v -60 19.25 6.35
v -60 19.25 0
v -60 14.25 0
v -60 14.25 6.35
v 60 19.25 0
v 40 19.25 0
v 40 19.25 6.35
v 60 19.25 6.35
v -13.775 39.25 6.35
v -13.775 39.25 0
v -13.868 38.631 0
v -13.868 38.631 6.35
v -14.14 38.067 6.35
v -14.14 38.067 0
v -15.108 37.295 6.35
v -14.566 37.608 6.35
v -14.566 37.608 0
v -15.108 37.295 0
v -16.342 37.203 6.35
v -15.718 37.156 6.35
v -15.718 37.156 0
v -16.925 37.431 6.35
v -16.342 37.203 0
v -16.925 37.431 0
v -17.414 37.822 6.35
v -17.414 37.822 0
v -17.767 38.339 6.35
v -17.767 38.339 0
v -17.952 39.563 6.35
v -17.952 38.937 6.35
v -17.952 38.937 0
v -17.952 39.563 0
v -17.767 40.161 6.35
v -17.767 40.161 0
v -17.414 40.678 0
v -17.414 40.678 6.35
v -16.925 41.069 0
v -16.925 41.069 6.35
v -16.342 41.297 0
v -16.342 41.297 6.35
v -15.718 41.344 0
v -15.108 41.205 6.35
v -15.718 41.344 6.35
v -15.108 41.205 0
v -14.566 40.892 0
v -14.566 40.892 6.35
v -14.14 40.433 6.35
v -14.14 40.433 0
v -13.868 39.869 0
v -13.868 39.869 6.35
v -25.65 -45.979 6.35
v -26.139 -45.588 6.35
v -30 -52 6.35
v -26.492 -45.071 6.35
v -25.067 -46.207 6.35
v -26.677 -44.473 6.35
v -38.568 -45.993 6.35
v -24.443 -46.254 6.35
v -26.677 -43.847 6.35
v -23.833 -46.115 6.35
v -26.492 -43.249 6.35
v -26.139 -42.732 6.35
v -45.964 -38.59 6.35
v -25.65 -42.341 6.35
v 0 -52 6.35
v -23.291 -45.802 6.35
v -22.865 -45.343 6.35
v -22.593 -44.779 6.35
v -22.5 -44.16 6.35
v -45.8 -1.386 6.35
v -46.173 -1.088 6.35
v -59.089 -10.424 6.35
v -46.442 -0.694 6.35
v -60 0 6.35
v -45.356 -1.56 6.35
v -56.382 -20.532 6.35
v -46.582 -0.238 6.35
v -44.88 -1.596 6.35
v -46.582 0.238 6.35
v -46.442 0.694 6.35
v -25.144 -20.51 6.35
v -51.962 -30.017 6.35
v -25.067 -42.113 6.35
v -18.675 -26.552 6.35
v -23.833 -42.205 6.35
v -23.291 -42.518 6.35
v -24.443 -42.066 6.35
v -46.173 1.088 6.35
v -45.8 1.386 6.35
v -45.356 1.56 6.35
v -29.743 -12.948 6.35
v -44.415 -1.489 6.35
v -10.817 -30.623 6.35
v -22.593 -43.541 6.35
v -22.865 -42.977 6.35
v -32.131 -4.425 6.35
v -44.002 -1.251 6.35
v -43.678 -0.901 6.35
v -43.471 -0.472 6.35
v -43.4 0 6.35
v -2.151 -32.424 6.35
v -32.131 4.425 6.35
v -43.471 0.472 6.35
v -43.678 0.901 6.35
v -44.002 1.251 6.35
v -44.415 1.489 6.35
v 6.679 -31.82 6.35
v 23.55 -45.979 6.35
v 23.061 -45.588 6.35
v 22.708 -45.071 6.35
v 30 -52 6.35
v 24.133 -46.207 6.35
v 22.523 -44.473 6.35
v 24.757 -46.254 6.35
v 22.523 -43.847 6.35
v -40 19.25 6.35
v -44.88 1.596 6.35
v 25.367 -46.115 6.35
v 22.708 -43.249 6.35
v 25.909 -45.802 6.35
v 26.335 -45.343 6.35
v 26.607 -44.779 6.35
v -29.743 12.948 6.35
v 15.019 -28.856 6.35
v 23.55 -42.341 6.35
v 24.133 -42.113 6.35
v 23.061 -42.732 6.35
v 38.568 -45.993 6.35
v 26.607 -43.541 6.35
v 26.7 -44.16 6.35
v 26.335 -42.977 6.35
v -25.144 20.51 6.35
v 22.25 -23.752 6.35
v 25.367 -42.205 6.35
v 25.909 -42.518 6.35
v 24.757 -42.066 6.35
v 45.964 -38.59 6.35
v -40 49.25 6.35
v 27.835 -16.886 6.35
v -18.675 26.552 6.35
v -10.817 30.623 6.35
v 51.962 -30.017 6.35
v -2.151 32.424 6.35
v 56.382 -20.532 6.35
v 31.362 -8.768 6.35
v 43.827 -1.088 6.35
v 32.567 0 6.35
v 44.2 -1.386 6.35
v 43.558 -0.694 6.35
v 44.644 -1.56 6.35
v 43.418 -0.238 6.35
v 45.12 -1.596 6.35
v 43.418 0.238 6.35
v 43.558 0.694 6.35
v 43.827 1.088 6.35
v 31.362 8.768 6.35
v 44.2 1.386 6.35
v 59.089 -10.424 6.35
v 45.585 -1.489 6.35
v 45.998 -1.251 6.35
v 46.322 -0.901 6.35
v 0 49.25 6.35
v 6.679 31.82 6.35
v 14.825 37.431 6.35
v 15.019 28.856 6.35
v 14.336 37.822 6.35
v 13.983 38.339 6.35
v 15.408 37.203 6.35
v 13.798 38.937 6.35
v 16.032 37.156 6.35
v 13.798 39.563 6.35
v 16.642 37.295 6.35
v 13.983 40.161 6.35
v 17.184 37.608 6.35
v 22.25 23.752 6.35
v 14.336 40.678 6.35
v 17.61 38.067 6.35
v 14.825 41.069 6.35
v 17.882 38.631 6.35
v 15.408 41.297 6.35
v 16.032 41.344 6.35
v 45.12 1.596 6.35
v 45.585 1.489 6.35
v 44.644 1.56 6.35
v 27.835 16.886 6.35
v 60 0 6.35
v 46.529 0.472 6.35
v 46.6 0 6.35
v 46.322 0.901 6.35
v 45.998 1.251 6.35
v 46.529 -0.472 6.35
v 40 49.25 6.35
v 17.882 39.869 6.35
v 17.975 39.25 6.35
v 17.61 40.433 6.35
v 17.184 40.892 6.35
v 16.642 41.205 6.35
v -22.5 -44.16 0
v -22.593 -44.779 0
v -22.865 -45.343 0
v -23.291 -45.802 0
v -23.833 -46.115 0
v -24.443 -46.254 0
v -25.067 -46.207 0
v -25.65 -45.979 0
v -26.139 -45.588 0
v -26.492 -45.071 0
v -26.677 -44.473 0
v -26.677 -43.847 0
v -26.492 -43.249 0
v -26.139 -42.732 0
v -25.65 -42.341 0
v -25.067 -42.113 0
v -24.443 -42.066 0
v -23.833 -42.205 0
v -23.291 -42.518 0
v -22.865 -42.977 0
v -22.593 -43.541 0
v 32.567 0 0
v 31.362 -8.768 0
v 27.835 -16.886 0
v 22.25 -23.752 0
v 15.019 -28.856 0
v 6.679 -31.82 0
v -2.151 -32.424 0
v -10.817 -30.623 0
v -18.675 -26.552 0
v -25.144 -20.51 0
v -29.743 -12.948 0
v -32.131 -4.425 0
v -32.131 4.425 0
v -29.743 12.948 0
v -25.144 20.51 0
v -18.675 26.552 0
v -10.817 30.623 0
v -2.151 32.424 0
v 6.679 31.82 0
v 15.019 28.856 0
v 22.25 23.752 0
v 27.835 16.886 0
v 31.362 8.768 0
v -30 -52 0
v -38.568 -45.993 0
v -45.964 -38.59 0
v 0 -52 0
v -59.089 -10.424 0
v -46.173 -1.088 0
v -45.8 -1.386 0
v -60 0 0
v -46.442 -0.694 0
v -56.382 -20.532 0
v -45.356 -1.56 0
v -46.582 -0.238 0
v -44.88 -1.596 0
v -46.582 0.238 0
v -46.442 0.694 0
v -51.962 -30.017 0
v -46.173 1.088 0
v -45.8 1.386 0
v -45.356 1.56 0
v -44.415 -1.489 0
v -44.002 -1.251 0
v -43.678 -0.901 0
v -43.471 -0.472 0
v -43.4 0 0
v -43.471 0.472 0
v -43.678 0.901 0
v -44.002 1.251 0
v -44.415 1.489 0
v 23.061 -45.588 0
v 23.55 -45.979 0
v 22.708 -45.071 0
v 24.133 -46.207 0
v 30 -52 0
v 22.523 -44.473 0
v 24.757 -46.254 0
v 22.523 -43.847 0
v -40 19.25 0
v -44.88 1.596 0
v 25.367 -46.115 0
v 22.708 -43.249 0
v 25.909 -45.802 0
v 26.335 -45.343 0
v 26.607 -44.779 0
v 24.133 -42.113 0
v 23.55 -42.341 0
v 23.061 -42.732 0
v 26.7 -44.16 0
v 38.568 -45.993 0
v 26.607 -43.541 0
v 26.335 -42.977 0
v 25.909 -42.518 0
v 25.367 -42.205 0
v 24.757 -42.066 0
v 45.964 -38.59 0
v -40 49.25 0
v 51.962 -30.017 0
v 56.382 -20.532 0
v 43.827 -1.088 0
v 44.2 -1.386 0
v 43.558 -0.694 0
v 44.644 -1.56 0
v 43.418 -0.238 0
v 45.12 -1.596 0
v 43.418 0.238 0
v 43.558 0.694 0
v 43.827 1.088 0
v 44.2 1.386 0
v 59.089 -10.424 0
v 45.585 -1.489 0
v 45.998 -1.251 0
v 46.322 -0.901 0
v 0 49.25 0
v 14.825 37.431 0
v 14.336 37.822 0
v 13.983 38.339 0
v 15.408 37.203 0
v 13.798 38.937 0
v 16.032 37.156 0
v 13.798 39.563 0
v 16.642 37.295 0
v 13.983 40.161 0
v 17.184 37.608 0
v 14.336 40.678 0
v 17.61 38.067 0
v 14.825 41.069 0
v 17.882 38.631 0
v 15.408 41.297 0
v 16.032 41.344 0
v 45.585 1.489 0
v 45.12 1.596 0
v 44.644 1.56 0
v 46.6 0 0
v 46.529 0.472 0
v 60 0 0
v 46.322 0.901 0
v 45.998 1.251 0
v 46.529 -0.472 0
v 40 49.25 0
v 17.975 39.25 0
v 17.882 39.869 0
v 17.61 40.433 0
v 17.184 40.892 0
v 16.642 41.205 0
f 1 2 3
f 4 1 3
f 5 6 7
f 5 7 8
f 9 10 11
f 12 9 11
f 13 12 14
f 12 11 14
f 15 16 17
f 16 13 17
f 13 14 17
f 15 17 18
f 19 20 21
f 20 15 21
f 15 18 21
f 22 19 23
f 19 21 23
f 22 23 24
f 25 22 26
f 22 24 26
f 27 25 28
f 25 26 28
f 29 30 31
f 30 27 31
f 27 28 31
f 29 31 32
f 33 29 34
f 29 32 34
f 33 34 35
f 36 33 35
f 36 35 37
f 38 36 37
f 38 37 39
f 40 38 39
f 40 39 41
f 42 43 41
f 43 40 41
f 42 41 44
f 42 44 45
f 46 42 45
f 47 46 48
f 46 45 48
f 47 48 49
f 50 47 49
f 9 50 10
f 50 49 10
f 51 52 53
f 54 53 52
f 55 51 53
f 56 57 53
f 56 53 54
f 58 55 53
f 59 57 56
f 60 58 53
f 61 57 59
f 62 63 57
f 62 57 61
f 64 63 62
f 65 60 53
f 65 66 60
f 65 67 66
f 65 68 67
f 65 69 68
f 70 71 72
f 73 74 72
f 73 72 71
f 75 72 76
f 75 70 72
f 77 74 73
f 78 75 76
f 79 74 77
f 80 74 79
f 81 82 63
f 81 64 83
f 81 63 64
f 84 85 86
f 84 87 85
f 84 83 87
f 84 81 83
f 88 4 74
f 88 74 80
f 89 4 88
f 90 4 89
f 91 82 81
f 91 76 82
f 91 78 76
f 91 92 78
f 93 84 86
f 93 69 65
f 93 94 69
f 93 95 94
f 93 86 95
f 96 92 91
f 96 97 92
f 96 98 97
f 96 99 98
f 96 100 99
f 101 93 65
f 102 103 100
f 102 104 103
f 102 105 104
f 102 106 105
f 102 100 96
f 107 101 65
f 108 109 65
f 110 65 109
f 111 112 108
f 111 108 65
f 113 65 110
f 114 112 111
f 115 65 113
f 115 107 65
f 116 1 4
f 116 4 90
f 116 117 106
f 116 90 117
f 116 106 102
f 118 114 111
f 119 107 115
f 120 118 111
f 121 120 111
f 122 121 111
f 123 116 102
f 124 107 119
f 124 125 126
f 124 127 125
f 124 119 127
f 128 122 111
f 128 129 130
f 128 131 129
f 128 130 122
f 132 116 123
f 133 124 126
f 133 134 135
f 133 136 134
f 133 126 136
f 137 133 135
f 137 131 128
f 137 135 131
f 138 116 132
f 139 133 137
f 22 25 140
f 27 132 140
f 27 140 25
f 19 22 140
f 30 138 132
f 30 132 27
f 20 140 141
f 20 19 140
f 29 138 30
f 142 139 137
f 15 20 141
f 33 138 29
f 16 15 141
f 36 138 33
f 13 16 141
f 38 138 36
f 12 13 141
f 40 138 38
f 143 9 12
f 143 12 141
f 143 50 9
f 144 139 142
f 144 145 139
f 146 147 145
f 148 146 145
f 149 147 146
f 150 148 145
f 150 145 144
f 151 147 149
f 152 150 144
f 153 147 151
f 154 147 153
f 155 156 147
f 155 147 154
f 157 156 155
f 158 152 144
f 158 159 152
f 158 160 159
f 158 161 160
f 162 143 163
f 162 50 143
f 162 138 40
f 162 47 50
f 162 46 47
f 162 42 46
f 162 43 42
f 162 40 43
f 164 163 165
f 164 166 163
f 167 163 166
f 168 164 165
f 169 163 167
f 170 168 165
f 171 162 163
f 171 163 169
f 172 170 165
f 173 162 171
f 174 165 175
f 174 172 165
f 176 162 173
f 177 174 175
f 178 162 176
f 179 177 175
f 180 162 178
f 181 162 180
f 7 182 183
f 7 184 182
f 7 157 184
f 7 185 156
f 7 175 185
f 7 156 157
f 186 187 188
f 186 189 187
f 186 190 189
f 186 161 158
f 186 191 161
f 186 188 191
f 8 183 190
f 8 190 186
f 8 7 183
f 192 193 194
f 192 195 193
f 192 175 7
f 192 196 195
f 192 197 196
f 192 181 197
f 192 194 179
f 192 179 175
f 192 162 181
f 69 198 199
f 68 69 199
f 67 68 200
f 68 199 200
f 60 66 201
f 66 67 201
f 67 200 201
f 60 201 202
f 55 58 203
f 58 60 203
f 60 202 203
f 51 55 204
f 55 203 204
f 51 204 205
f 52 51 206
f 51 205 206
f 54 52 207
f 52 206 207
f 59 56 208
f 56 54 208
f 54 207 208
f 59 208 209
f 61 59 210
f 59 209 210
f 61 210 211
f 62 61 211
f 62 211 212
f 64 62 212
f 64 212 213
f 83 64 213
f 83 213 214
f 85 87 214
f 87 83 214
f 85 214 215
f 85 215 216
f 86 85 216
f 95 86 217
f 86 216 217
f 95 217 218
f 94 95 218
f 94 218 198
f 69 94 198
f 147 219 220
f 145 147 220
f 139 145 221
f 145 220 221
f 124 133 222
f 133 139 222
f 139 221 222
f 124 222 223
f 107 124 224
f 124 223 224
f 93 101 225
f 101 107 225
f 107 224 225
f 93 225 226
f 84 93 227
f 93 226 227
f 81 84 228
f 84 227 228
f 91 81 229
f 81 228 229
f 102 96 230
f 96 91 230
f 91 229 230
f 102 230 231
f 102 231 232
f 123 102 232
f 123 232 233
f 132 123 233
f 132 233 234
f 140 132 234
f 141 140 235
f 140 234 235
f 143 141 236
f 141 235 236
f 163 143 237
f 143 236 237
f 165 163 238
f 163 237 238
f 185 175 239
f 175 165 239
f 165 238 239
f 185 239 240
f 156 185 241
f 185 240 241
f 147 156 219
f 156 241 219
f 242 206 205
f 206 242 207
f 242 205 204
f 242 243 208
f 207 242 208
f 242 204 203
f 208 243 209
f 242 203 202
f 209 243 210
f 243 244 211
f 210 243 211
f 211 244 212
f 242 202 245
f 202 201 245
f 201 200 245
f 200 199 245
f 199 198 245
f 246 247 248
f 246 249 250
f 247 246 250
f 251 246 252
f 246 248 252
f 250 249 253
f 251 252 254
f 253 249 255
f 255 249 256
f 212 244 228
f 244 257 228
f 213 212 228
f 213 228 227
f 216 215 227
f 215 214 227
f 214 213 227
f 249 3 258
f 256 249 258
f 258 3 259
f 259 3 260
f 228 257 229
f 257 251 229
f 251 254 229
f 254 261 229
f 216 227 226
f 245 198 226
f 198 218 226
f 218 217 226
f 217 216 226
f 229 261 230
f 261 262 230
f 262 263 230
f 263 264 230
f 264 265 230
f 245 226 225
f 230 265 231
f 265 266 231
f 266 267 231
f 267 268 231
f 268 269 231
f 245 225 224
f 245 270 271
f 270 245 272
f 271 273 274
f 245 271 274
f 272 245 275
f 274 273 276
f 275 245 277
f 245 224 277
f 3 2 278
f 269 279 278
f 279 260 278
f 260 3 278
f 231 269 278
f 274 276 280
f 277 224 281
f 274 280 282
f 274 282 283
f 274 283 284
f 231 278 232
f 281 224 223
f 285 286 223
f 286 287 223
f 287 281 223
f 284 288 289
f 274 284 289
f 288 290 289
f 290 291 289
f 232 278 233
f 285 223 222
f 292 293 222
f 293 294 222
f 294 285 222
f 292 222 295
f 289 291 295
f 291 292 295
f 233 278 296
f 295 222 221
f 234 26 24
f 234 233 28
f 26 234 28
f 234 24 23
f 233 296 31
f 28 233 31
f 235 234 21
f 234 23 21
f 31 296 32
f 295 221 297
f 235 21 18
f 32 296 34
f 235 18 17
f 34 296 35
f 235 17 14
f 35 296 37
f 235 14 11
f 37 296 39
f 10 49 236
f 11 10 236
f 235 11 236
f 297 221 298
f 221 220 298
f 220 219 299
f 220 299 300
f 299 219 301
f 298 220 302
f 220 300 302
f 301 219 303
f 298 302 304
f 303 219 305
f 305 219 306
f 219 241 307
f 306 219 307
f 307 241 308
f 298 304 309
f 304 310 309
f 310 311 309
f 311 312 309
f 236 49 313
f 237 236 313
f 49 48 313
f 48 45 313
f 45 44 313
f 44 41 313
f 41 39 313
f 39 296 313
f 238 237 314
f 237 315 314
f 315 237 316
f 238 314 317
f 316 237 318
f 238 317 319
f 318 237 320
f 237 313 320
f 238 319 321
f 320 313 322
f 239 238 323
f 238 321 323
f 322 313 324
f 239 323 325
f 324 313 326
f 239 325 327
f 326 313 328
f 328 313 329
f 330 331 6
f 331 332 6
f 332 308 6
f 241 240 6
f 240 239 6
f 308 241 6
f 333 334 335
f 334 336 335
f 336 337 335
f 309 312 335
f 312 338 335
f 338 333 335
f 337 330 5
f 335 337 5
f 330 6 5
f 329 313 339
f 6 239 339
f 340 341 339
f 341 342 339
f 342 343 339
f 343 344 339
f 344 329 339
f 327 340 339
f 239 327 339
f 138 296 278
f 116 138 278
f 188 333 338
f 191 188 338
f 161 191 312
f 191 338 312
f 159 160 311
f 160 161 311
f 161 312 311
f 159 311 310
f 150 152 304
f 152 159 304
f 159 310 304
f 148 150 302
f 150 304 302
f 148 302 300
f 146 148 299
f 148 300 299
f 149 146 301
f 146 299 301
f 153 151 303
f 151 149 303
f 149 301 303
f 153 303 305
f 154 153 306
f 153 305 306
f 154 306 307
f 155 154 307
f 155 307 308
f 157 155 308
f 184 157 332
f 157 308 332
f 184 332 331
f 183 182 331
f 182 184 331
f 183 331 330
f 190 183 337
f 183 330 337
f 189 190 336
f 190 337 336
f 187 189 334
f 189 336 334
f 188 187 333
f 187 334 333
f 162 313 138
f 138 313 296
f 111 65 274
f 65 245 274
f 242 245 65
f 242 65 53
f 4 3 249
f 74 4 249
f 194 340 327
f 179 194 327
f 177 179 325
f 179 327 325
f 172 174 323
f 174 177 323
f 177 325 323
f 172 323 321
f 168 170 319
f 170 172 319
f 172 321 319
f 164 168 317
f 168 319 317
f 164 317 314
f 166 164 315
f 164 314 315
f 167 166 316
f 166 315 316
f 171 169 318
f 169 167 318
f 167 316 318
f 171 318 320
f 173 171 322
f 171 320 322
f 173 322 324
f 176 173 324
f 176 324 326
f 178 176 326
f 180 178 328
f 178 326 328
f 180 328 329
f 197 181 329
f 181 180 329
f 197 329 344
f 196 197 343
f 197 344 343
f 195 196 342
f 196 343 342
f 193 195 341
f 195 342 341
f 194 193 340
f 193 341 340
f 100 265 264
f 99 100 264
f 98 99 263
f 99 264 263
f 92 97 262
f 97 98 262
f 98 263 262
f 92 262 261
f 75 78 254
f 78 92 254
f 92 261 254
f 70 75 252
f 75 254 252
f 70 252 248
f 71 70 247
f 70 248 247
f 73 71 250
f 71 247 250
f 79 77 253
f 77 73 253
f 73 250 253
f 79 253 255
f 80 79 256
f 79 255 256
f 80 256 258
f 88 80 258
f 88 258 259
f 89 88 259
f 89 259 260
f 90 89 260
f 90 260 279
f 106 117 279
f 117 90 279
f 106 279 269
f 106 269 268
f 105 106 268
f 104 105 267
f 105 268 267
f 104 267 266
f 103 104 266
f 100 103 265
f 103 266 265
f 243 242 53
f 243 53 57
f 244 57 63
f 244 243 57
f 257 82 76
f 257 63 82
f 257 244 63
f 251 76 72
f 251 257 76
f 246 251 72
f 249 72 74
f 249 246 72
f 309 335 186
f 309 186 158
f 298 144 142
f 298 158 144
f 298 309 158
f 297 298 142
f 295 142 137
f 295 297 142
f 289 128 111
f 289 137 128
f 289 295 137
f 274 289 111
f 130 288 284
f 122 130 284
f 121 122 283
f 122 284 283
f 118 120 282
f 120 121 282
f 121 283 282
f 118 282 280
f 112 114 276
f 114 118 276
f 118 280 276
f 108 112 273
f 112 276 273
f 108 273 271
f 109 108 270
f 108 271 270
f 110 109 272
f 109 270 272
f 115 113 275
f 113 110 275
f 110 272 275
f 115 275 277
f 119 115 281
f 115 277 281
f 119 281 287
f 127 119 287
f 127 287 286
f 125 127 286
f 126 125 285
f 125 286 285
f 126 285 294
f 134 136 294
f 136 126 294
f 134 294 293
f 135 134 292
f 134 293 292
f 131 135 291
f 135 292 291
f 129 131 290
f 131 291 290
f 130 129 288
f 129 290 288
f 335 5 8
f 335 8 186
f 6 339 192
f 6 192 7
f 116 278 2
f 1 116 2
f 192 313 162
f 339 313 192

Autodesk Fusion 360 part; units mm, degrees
sketch "Sketch1" plane through (0, 0, 0) normal (0, 0, 1) x (1, 0, 0)
  line L0 (0, 49.25) -> (40, 49.25)
  line L1 (40, 49.25) -> (40, 19.25)
  line L2 (40, 19.25) -> (60, 19.25)
  line L3 (60, 19.25) -> (60, 0)
  line L4 (0, -52) -> (30, -52)
  arc A0 (30, -52) -> (60, 0) centre (-0.0667, 0) ccw
  circle A1 centre (15.875, 39.25) radius 2.1
  circle A2 centre (45, 0) radius 1.6
  circle A3 centre (24.6, -44.1599) radius 2.1
  circle A4 centre (-45, 0) radius 1.6
  line L5 (-60, 14.25) -> (-60, 0)
  arc A5 (-60, 0) -> (-30, -52) centre (0.0667, 0) ccw
  line L6 (0, -52) -> (-30, -52)
  line L7 (0, 49.25) -> (-40, 49.25)
  circle A6 centre (0.0667, 0) radius 32.5
  line L8 (-40, 49.25) -> (-40, 19.25)
  line L9 (-40, 19.25) -> (-60, 19.25)
  line L10 (-60, 19.25) -> (-60, 14.25)
  circle A7 centre (-24.6, -44.1599) radius 2.1
  circle A8 centre (-15.875, 39.25) radius 2.1
  dimension "d1" = 49.25
  dimension "d2" = 40
  dimension "d3" = 30
  dimension "d4" = 20
  dimension "d5" = 52
  dimension "d6" = 30
  dimension "d12" = 4.2
  dimension "d13" = 45
  dimension "d14" = 3.2
  dimension "d17" = 4.2
  dimension "d20" = 65
  dimension "d23" = 30
  dimension "d24" = 4.2
  dimension "d25" = 4.2
extrude "Extrude4" add sketch "Sketch1" along normal blind 6.35
